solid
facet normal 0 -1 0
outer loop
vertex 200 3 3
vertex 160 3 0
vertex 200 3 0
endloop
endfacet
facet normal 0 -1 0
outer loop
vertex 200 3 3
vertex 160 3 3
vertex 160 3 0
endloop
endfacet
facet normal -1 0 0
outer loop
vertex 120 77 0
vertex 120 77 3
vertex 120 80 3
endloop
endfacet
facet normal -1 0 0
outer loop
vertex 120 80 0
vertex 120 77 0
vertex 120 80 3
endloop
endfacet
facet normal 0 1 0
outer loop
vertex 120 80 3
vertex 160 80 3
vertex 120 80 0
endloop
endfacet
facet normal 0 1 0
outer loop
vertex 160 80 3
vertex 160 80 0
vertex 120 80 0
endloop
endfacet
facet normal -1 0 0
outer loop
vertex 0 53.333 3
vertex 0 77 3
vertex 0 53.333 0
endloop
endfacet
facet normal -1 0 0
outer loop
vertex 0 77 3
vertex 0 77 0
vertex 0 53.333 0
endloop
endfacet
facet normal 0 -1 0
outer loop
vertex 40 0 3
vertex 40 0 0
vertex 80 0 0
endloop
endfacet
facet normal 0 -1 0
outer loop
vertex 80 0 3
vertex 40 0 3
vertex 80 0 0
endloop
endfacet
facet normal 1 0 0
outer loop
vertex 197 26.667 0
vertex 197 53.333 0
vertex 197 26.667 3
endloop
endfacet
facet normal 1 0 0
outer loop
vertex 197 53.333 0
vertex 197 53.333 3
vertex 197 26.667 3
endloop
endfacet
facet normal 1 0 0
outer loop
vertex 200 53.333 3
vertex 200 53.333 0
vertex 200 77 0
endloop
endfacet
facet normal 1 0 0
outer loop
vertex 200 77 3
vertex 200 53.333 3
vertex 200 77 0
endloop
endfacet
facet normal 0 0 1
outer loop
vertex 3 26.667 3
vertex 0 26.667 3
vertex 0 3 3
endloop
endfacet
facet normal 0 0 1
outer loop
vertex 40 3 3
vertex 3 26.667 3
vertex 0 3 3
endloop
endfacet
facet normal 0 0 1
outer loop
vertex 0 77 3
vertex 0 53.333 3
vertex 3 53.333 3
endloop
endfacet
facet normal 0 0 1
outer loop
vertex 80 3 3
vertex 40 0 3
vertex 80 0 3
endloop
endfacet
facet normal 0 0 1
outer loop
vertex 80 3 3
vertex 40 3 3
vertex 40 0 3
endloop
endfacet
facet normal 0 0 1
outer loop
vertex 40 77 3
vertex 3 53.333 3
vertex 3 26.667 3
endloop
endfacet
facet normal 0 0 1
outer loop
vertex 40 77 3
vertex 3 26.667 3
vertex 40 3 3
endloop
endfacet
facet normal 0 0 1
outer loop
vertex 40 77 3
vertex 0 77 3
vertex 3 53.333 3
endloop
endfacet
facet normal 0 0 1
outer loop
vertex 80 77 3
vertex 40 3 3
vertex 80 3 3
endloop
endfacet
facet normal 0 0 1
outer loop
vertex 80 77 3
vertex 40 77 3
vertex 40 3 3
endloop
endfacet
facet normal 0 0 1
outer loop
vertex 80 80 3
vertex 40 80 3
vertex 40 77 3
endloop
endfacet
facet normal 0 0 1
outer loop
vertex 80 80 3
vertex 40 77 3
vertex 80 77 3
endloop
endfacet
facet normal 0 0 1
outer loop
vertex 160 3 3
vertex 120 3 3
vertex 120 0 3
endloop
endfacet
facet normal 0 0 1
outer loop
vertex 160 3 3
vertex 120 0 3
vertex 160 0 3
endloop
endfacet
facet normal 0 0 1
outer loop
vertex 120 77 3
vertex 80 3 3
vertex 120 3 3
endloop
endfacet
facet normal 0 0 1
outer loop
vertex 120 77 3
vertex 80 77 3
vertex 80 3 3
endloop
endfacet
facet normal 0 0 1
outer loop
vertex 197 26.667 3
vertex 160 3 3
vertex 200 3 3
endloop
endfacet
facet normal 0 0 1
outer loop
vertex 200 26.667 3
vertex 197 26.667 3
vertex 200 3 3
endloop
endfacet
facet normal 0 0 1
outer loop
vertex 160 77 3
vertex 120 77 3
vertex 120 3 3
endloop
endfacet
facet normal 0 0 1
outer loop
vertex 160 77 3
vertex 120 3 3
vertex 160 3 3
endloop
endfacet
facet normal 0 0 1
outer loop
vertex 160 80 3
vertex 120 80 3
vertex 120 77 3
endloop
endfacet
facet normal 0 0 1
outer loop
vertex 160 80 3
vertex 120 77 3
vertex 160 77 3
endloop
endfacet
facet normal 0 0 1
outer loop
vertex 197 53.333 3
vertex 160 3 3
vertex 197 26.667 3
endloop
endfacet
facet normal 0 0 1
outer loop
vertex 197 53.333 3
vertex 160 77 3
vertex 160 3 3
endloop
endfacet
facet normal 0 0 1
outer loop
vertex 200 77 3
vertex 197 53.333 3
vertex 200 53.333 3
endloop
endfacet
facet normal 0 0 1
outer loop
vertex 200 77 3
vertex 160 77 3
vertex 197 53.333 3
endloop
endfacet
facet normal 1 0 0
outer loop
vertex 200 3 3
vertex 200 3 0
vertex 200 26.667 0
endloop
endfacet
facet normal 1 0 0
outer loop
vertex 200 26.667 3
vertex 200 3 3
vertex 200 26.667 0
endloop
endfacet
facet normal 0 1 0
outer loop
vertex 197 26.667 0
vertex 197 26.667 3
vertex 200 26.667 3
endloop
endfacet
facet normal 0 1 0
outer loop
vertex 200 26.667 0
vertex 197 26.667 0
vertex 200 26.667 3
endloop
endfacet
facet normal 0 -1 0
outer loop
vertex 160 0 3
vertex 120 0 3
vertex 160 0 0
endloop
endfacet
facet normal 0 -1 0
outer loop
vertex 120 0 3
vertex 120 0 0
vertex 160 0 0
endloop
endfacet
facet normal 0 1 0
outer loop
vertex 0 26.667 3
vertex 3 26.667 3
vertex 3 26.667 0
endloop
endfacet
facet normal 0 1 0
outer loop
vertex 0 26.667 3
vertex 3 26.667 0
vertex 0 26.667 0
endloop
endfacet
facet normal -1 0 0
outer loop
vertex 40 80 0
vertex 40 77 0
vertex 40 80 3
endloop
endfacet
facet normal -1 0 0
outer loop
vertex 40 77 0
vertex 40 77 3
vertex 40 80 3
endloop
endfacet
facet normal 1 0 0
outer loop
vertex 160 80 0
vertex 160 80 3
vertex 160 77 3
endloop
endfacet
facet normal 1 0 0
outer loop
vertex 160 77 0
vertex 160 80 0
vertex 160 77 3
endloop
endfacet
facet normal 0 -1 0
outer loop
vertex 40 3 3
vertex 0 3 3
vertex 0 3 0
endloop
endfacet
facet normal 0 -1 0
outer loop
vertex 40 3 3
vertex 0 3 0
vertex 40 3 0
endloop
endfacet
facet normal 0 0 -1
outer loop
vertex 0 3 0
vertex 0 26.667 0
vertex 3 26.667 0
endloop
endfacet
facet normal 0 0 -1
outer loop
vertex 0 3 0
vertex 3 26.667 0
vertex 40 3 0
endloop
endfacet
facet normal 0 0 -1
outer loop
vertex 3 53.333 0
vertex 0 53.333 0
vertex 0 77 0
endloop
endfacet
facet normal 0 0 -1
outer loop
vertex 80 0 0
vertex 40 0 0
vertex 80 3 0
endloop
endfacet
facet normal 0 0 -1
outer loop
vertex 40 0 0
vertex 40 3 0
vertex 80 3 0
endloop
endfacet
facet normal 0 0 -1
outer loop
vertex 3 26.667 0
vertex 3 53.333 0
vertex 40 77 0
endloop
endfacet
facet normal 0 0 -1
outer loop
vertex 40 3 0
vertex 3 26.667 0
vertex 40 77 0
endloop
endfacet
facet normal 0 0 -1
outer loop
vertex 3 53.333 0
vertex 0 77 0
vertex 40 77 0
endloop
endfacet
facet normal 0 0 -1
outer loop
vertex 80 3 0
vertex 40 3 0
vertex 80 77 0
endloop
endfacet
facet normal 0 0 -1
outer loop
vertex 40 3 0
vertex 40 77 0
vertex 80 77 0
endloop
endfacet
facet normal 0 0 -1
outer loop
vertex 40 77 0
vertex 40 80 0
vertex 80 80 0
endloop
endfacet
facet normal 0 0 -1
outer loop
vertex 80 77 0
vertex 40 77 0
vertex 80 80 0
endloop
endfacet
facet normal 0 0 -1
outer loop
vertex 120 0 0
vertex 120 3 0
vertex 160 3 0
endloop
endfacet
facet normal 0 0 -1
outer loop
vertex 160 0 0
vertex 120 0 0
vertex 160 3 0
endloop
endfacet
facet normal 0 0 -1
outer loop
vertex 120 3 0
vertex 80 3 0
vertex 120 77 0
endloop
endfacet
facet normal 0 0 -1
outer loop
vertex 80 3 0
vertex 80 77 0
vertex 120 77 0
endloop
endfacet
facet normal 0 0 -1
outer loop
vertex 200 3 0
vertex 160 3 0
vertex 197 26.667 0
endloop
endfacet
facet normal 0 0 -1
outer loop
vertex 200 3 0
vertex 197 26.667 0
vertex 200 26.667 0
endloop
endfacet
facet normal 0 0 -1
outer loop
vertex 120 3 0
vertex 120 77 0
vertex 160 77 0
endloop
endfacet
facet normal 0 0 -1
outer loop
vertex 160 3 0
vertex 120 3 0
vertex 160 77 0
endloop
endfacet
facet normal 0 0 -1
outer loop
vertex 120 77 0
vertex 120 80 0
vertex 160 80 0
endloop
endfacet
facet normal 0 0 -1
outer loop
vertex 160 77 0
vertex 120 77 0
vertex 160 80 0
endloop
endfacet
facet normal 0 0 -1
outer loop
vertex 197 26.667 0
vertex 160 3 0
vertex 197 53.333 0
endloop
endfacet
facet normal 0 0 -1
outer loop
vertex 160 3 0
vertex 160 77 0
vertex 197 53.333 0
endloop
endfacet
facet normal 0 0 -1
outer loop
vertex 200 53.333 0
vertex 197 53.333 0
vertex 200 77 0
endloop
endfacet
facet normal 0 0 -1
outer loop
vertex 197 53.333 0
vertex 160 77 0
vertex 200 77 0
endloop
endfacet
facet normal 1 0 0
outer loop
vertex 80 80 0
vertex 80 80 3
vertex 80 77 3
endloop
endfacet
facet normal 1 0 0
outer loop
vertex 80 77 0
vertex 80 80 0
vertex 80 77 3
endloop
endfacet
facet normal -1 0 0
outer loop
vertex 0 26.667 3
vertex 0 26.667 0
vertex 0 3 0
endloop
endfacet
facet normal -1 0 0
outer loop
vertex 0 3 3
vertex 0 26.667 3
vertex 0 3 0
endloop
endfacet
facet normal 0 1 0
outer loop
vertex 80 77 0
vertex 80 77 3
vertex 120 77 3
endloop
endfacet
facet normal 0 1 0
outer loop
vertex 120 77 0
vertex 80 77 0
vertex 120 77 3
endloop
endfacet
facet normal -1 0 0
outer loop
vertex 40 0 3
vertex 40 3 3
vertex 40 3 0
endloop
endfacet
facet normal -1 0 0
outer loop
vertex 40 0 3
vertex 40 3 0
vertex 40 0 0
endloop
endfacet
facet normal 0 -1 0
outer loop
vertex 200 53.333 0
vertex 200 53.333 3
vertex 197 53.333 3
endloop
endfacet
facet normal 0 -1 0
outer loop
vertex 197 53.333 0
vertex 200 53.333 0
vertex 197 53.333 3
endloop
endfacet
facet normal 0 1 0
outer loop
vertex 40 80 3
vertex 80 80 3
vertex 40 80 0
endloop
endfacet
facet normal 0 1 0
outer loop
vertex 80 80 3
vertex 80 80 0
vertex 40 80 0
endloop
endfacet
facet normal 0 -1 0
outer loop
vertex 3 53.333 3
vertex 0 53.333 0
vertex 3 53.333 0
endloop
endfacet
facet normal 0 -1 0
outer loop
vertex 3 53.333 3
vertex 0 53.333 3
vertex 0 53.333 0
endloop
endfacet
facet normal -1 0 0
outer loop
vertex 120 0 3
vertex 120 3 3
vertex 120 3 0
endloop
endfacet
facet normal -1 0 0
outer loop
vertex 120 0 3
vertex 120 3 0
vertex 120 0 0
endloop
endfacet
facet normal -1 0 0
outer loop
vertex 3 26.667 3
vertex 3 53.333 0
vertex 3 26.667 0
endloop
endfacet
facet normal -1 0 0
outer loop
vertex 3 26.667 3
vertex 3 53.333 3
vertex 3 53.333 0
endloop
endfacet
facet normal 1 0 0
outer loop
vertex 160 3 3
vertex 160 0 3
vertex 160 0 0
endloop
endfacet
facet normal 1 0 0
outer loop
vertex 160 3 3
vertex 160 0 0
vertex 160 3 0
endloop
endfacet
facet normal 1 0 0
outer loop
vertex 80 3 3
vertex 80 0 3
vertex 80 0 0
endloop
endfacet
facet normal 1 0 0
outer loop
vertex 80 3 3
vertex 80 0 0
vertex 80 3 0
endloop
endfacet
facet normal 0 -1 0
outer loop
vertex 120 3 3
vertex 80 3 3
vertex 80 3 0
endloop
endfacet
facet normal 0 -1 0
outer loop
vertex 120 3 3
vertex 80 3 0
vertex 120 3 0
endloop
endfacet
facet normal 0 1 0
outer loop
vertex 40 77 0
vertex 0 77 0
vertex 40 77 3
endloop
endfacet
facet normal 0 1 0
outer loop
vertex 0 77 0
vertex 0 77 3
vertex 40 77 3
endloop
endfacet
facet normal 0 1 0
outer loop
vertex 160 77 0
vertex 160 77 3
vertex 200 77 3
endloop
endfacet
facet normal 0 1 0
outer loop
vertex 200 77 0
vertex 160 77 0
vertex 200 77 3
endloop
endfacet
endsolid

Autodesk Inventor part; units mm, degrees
ref_plane "YZ Plane" through (0, 0, 0) normal (1, 0, 0) x (0, 1, 0)
ref_plane "XZ Plane" through (0, 0, 0) normal (0, 1, 0) x (-1, 0, 0)
ref_plane "XY Plane" through (0, 0, 0) normal (0, 0, 1) x (1, 0, 0)
sketch "Sketch1" plane through (0, 0, 0) normal (0, 0, 1) x (1, 0, 0)
  line L0 (0, 0) -> (200, 0)
  line L1 (200, 0) -> (200, 80)
  line L2 (200, 80) -> (0, 80)
  line L3 (0, 80) -> (0, 0)
  dimension "d0" = 200
  dimension "d1" = 80
extrude "Extrusion1" add sketch "Sketch1" along normal blind 3
sketch "Sketch2" plane through (0, 0, 3) normal (0, 0, 1) x (1, 0, 0)
  line L0 (0, 0) -> (0, 3)
  line L1 (0, 3) -> (40, 3)
  line L2 (40, 3) -> (40, 0)
  line L3 (0, 0) -> (200, 0) projected
  line L4 (40, 0) -> (80, 0)
  line L5 (80, 0) -> (80, 3)
  line L6 (80, 3) -> (120, 3)
  line L7 (120, 3) -> (120, 0)
  line L8 (120, 0) -> (160, 0)
  line L9 (160, 0) -> (160, 3)
  line L10 (160, 3) -> (200, 3)
  line L11 (0, 80) -> (0, 0) projected
  line L12 (0, 80) -> (0, 77)
  line L13 (0, 77) -> (40, 77)
  line L14 (40, 77) -> (40, 80)
  line L15 (0, 80) -> (200, 80)
  line L16 (40, 80) -> (80, 80)
  line L17 (80, 80) -> (80, 77)
  line L18 (80, 77) -> (120, 77)
  line L19 (120, 77) -> (120, 80)
  line L20 (120, 80) -> (160, 80)
  line L21 (160, 80) -> (160, 77)
  line L22 (160, 77) -> (200, 77)
  line L23 (200, 80) -> (0, 80) projected
  line L24 (0, 80) -> (0, 53.3333)
  line L25 (0, 53.3333) -> (3, 53.3333)
  line L26 (3, 53.3333) -> (3, 26.6667)
  line L27 (3, 26.6667) -> (0, 26.6667)
  line L28 (200, 53.3333) -> (197, 53.3333)
  line L29 (197, 53.3333) -> (197, 26.6667)
  line L30 (197, 26.6667) -> (200, 26.6667)
  line L31 (160, 77) -> (160, 80)
  line L32 (200, 77) -> (200, 80)
  line L33 (200, 3) -> (200, 0)
  line L34 (200, 26.6667) -> (200, 53.3333)
  dimension "d4" = 3
  dimension "d5" = 40
  dimension "d6" = 40
  dimension "d7" = 40
  dimension "d8" = 40
  dimension "d9" = 26.6667
  dimension "d10" = 3
  dimension "d11" = 26.6667
extrude "Extrusion2" cut sketch "Sketch2" against normal blind 3
properties part number "TAPA 2"
